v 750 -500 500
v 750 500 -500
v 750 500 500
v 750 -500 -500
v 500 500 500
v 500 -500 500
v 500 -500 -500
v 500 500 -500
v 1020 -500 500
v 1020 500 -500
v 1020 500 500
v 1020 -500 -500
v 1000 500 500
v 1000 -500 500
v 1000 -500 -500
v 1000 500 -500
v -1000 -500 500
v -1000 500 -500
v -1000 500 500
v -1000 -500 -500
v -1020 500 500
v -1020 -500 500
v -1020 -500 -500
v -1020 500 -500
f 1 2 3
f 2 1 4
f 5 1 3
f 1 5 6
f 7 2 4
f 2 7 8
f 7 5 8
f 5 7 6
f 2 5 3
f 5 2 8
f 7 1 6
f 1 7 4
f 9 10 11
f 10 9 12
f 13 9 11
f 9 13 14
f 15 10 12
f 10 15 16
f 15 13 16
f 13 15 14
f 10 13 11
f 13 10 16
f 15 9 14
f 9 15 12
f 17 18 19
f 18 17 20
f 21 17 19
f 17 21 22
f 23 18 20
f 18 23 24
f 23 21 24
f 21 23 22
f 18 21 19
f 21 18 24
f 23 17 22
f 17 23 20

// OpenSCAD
color("silver")
translate([500+125,0,0])
cube([250,1000,1000],center=true);
color("pink")
translate([1000+10,0,0])
cube([20,1000,1000],center=true);
color("pink")
translate([-(1000+10),0,0])
cube([20,1000,1000],center=true);
